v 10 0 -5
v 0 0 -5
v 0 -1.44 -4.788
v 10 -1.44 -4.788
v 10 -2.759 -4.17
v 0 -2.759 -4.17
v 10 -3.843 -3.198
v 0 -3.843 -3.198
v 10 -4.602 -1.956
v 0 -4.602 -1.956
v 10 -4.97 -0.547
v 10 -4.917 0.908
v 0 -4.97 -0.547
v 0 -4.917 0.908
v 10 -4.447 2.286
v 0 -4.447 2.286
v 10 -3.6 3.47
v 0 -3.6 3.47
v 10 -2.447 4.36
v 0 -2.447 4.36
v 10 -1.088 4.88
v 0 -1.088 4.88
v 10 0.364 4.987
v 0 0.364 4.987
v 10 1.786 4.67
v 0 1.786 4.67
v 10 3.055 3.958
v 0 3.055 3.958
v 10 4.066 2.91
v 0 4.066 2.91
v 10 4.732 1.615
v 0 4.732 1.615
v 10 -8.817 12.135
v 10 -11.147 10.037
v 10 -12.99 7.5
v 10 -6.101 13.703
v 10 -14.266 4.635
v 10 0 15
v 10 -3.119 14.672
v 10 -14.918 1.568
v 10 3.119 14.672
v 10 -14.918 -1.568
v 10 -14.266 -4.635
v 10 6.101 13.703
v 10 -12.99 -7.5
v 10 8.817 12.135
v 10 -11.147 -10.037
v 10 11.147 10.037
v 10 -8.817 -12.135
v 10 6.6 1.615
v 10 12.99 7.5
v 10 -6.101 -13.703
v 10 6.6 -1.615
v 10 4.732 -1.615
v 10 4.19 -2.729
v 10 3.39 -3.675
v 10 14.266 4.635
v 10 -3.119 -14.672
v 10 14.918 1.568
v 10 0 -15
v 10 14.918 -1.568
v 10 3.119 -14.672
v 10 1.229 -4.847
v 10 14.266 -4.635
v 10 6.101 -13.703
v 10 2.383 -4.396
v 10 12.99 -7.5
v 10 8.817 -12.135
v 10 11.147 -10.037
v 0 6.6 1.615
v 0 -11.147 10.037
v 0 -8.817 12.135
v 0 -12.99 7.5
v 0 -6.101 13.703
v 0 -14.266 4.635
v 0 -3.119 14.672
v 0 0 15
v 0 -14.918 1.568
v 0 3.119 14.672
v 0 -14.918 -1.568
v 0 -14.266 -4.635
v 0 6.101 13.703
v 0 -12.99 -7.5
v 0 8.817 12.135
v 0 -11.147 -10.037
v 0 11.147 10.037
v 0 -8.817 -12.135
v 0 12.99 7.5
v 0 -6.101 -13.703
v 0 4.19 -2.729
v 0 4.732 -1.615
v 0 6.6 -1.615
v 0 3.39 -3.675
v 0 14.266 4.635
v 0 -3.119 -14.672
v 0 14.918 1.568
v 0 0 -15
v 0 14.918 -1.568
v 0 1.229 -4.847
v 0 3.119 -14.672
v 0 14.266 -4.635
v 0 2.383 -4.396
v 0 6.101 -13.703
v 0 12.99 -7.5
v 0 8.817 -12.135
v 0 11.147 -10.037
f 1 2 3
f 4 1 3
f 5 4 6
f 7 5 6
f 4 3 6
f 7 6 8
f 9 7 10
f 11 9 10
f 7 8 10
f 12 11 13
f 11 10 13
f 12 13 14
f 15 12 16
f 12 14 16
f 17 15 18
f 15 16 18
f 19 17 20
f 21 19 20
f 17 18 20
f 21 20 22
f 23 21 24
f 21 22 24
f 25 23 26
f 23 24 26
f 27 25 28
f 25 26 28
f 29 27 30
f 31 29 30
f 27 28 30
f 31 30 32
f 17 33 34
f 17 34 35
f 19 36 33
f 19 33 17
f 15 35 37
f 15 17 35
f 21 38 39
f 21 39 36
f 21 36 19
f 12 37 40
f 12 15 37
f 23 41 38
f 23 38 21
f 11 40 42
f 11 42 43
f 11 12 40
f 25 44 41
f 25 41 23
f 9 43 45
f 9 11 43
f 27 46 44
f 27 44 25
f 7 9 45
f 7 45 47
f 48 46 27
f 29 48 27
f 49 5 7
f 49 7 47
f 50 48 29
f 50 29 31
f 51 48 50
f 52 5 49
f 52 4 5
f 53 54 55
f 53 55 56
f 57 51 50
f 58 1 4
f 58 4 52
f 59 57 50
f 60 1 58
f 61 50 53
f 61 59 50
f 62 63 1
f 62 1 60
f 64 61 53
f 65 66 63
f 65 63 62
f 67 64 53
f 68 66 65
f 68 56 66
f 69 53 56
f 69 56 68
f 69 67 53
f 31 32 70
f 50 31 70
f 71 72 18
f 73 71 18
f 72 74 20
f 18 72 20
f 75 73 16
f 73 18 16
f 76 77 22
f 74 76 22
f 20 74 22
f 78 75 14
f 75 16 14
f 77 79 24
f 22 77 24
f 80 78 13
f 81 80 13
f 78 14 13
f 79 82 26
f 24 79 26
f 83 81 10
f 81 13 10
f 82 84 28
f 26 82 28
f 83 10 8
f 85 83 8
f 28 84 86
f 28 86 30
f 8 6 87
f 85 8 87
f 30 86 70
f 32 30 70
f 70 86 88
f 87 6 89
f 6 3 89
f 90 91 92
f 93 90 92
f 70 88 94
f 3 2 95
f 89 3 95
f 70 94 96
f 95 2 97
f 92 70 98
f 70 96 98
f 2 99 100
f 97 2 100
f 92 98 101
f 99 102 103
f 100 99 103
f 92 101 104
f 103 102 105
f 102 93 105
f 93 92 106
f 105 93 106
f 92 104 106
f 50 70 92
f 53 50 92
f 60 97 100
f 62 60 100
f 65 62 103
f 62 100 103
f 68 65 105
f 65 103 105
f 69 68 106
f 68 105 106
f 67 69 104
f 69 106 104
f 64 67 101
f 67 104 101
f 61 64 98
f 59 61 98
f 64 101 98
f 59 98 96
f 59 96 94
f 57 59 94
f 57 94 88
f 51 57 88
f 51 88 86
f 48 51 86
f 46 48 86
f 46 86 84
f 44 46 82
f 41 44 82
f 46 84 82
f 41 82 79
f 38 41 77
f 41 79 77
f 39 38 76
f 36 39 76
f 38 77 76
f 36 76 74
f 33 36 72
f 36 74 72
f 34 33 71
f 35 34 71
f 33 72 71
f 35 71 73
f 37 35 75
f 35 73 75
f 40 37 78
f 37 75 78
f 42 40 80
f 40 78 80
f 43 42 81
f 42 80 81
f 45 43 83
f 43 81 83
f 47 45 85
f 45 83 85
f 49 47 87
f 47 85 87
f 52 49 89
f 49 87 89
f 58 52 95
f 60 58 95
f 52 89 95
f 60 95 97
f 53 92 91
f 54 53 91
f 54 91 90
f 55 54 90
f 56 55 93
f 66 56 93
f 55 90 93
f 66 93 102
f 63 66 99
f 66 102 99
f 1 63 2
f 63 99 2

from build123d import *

# Parameters (mm, degrees)
SKETCH1_R           = 15
BOSS_EXTRUDE1_DEPTH = 10


with BuildPart() as part:
    # Sketch1 → Boss-Extrude1 (new body)
    with BuildSketch(Plane(origin=(0, 0, 0), x_dir=(0, 0, -1), z_dir=(1, 0, 0))):
        Circle(SKETCH1_R)
        with BuildLine():
            Line((1.615081939, 6.6), (1.615081939, 4.731966857))
            ThreePointArc((1.615081939, 4.731966857), (4.0666577, 2.909002433), (5, 0))
            ThreePointArc((5, 0), (-2.909002433, -4.0666577), (-1.615081939, 4.731966857))
            Line((-1.615081939, 4.731966857), (-1.615081939, 6.6))
            Line((-1.615081939, 6.6), (1.615081939, 6.6))
        make_face(mode=Mode.SUBTRACT)
    extrude(amount=BOSS_EXTRUDE1_DEPTH)


solid = part.part
